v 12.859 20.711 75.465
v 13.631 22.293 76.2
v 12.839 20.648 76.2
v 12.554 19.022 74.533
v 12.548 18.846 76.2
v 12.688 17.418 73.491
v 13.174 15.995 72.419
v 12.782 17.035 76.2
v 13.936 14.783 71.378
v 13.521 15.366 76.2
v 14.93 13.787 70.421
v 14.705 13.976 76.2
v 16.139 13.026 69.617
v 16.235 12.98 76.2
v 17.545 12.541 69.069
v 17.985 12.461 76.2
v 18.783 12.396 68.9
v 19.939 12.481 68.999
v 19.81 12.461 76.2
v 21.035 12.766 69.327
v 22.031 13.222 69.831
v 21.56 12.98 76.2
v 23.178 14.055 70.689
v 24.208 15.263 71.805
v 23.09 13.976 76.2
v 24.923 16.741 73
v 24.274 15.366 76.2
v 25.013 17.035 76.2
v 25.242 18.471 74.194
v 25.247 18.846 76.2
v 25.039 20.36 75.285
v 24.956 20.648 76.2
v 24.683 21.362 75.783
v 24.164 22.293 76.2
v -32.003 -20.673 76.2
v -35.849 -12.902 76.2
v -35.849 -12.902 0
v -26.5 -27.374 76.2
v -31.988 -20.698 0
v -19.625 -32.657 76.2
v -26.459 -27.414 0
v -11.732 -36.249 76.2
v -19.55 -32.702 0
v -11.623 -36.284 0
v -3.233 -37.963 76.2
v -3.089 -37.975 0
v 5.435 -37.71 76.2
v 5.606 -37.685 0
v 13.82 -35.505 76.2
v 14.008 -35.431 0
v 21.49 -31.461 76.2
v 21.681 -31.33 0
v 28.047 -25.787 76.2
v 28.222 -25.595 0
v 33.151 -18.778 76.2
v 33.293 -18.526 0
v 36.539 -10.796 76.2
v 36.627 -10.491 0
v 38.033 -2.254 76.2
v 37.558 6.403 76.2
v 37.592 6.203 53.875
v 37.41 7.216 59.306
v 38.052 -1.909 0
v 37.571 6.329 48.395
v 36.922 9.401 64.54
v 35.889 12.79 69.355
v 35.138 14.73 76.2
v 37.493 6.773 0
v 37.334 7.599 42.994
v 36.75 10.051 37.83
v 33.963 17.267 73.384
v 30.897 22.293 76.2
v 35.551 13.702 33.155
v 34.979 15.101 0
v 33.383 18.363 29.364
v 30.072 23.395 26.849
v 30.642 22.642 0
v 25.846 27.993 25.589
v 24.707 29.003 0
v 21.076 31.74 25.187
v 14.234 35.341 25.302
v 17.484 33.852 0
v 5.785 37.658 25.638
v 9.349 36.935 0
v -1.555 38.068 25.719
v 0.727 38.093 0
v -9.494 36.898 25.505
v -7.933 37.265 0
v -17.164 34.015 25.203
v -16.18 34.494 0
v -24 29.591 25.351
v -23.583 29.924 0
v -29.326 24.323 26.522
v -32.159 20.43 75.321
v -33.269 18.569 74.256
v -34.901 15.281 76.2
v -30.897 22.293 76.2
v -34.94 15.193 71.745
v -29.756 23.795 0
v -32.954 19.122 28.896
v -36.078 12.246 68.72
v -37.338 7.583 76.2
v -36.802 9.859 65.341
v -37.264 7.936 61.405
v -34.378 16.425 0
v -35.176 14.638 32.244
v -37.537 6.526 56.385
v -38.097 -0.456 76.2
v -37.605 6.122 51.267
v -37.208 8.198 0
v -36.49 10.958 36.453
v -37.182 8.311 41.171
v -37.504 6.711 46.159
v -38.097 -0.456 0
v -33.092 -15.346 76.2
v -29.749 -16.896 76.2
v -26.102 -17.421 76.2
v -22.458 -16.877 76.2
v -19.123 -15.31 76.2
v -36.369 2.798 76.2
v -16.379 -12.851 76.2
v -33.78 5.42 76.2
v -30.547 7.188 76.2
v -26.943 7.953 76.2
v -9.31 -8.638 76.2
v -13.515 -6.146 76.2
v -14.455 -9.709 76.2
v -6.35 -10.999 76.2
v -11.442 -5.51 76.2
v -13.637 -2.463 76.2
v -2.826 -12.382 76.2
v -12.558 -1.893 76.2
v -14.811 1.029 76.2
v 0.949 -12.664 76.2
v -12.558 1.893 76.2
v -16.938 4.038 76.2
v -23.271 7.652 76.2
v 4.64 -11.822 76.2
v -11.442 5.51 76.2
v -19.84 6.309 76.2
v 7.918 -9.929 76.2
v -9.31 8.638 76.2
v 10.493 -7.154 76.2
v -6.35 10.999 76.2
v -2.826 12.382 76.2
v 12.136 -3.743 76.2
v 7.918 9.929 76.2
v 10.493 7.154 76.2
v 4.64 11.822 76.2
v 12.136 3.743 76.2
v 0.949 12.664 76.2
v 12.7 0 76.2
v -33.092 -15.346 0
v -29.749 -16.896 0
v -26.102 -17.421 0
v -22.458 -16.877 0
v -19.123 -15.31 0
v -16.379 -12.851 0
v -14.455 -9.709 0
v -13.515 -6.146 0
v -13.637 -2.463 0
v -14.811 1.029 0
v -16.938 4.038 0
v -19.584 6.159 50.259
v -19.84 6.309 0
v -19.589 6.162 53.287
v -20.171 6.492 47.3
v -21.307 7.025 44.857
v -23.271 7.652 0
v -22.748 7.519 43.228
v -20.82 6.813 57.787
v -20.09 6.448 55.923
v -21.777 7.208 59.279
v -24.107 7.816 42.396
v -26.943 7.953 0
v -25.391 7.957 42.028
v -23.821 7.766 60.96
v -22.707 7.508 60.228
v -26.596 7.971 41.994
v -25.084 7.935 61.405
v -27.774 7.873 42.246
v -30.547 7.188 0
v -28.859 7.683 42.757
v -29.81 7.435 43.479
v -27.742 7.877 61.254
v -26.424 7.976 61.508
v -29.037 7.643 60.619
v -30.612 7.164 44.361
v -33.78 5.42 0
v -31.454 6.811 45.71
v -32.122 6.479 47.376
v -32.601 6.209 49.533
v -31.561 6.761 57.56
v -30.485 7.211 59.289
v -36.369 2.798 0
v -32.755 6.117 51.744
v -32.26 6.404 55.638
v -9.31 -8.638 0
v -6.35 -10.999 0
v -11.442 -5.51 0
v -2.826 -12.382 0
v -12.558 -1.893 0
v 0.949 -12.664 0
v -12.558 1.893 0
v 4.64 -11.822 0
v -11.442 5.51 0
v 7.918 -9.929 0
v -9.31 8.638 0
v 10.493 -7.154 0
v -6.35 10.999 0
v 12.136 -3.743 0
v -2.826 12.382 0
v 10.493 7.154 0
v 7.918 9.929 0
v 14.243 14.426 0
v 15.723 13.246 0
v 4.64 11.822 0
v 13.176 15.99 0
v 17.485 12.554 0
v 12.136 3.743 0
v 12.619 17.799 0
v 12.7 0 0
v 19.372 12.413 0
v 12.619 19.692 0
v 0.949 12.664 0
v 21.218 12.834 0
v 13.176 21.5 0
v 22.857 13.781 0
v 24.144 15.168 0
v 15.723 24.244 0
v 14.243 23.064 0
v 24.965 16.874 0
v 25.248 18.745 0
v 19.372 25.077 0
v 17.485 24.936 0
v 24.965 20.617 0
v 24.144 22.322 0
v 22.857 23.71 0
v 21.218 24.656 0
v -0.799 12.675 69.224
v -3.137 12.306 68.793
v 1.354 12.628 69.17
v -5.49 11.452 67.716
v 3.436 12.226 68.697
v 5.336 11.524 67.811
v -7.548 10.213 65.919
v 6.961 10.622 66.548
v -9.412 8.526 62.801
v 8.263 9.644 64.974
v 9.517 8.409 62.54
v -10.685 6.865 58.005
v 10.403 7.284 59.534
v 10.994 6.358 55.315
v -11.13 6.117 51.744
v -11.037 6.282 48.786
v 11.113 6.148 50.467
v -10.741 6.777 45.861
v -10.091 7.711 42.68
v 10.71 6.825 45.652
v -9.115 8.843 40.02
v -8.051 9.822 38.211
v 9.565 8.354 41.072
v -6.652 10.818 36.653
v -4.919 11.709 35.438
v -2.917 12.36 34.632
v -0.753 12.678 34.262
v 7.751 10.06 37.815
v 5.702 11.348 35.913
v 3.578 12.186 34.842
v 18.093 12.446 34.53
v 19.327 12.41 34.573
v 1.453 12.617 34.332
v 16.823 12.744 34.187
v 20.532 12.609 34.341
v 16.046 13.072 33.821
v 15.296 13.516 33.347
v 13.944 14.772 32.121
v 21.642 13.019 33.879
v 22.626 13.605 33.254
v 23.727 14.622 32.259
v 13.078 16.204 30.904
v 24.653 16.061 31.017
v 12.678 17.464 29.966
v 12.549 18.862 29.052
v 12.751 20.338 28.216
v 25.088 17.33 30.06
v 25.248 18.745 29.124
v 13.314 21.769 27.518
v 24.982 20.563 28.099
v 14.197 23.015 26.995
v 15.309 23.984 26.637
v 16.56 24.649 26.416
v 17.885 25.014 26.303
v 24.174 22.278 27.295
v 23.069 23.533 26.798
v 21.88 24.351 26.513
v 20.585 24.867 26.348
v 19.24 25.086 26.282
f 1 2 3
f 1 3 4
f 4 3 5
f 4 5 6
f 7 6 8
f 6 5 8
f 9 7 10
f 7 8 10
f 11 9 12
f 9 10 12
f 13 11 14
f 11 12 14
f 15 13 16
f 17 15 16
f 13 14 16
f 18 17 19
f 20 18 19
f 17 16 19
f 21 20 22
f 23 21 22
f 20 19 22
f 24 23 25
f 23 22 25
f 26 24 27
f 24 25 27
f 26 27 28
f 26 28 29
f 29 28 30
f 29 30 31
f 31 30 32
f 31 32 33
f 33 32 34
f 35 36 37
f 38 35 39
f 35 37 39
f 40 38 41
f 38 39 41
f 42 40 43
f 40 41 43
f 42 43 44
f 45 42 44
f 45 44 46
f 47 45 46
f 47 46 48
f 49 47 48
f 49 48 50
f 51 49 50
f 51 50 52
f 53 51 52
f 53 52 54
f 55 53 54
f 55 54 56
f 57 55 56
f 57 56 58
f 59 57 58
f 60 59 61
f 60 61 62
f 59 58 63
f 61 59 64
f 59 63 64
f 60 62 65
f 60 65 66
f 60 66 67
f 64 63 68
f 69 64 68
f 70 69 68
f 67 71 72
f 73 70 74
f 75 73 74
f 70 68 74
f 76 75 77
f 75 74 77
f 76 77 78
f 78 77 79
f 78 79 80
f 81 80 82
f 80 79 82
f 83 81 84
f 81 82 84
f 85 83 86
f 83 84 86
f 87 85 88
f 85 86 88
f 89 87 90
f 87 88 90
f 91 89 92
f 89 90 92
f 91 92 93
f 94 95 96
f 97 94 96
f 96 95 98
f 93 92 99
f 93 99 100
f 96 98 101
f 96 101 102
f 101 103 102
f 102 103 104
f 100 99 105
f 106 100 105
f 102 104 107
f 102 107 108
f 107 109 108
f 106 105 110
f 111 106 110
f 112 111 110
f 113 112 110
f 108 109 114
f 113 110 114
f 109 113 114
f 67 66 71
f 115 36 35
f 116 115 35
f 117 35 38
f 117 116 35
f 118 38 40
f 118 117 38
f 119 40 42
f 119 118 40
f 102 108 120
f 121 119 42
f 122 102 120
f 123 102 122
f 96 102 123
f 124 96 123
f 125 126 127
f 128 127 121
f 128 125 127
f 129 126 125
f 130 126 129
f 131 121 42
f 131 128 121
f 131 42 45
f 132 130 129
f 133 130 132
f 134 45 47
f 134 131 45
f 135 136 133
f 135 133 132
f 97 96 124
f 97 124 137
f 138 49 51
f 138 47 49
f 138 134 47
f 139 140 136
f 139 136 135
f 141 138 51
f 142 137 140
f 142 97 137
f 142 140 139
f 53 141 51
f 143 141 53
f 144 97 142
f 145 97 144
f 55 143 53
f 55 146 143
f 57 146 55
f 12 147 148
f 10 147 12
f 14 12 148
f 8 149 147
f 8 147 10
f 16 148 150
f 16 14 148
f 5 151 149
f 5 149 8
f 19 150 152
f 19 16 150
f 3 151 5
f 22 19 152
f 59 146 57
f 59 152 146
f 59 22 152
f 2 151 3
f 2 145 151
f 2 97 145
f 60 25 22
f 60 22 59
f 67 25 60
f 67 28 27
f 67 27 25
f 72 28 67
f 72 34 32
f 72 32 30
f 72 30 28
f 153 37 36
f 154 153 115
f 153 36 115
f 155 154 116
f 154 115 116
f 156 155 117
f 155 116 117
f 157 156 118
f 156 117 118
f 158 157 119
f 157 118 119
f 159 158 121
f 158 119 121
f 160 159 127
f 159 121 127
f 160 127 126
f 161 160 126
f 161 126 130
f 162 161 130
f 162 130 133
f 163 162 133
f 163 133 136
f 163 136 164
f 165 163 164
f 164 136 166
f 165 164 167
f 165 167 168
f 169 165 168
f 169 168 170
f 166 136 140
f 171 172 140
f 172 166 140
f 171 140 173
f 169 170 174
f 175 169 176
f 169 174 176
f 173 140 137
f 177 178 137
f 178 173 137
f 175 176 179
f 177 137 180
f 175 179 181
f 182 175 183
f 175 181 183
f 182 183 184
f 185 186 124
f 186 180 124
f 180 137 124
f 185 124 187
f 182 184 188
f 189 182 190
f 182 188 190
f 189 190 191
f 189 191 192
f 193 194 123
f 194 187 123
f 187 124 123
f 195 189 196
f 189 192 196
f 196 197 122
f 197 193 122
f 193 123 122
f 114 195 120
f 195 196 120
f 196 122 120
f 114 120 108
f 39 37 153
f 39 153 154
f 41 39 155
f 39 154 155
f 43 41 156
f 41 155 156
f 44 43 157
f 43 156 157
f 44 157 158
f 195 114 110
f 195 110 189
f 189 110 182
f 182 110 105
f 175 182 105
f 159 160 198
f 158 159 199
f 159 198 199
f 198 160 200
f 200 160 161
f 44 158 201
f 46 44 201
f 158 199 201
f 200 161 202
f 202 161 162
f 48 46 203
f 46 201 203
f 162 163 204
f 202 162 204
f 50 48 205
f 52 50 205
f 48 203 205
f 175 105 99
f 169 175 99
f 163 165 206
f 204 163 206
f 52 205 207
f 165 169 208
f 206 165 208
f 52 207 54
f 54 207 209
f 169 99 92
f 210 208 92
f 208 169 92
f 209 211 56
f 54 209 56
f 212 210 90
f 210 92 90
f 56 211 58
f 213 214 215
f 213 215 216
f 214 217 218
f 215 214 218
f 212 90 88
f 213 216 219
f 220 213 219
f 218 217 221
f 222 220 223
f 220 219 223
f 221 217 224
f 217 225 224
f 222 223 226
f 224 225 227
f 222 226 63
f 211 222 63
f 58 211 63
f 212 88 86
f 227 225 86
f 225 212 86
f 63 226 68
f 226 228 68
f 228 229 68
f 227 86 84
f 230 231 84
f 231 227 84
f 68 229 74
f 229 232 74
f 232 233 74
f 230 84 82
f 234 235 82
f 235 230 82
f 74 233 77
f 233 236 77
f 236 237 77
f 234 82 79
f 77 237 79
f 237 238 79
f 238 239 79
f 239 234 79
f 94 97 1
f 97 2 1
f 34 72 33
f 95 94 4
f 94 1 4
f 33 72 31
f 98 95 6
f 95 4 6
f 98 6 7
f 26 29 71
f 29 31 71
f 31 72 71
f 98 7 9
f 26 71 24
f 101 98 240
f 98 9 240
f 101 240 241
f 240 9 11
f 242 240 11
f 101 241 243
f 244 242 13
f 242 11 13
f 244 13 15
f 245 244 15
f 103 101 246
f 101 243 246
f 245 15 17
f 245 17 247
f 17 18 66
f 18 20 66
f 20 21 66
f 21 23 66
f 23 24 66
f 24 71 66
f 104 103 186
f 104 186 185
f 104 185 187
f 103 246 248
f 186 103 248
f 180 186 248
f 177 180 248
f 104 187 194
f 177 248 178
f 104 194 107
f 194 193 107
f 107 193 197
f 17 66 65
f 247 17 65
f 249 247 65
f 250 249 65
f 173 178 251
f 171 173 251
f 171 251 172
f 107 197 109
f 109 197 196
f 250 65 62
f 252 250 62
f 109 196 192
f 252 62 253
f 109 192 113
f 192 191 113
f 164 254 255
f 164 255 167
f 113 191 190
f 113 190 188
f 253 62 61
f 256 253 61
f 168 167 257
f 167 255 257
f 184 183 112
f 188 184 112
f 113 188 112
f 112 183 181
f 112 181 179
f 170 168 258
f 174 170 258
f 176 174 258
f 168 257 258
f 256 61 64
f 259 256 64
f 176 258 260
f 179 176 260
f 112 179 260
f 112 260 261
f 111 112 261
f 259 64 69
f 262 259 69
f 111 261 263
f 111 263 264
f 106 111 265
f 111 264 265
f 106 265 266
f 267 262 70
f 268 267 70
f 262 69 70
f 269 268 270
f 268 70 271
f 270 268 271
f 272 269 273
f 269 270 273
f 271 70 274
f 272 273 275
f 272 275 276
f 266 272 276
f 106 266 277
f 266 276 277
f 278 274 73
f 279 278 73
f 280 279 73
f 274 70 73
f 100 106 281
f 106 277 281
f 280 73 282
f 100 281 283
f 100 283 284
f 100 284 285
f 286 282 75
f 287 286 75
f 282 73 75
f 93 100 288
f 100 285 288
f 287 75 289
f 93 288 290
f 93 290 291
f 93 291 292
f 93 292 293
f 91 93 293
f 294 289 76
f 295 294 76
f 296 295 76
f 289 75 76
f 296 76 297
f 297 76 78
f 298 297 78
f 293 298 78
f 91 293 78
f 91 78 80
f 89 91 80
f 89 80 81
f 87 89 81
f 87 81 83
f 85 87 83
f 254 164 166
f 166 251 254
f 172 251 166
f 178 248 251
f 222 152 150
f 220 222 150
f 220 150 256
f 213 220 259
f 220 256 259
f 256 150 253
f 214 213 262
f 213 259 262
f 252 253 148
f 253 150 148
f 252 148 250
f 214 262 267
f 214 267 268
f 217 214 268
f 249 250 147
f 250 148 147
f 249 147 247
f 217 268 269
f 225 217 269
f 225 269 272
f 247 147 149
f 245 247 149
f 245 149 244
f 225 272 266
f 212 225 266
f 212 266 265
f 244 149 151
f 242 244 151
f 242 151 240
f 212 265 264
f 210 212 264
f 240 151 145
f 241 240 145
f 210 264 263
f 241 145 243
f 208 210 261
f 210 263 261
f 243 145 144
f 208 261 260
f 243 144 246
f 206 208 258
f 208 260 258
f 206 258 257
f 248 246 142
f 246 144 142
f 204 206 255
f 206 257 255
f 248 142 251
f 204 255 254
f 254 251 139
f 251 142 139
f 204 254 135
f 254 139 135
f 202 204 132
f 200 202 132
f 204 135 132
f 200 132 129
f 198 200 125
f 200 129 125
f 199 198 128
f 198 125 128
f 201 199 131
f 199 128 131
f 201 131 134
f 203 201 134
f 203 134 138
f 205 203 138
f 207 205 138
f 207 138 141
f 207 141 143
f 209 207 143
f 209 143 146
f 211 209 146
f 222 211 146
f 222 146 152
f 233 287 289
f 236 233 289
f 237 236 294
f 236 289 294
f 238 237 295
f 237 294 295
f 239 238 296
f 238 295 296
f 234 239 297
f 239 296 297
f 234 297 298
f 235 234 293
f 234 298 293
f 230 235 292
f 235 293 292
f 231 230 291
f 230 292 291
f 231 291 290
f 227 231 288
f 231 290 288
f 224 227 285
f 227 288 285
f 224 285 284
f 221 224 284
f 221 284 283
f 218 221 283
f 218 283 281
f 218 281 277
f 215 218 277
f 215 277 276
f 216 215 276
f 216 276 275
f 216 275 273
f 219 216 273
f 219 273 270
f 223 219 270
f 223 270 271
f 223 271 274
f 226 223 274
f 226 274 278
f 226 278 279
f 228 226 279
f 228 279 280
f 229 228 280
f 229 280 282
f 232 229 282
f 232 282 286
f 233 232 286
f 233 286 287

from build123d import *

# Parameters (mm, degrees)
F0_R      = 38.1
F1_DEPTH  = 76.2
F2_R      = 12.7
F3_DEPTH  = 255.778
F4_R      = 6.35
F5_DEPTH  = 105.156
F7_R      = 12.7
F8_DEPTH  = 112.522
F10_DEPTH = 91.694


with BuildPart() as f1:
    # F0 (on Top) → F1 (new body)
    with BuildSketch(Plane.XY):
        Circle(F0_R)
    extrude(amount=F1_DEPTH)

    # F2 (on face) → F3 (cut)
    with BuildSketch(Plane.XY.offset(76.2)):
        Circle(F2_R)
    extrude(amount=-F3_DEPTH, mode=Mode.SUBTRACT)

    # F4 (on face) → F5 (cut)
    with BuildSketch(Plane.XY.offset(76.2)):
        with Locations((18.897600472, 18.7452007085)):
            Circle(F4_R)
    extrude(amount=-F5_DEPTH, mode=Mode.SUBTRACT)

    # F7 (on face) → F8 (cut)
    with BuildSketch(Plane.XY.offset(76.2)):
        with Locations((-26.1348858476, -4.7210869379)):
            Circle(F7_R)
    extrude(amount=-F8_DEPTH, mode=Mode.SUBTRACT)

    # F9 (on Right) → F10 (cut, symmetric)
    with BuildSketch(Plane.YZ):
        with BuildLine():
            ThreePointArc((53.601659511, 35.343534931), (57.8103975555, 43.0686388402), (59.2664996787, 51.7444945872))
            ThreePointArc((59.2664996787, 51.7444945872), (58.1456298442, 59.3810526604), (54.8775729197, 66.3734179491))
            ThreePointArc((54.8775729197, 66.3734179491), (42.9419800159, 51.3230223587), (53.601659511, 35.343534931))
        make_face()
        with BuildLine():
            ThreePointArc((54.8775729197, 66.3734179491), (58.1456298442, 59.3810526604), (59.2664996787, 51.7444945872))
            ThreePointArc((59.2664996787, 51.7444945872), (57.8103975555, 43.0686388402), (53.601659511, 35.343534931))
            ThreePointArc((53.601659511, 35.343534931), (68.575369435, 37.2686066813), (75.5599205639, 50.6526993162))
            ThreePointArc((75.5599205639, 50.6526993162), (69.1173648929, 63.6421228832), (54.8775729197, 66.3734179491))
        make_face()
        with BuildLine():
            ThreePointArc((53.601659511, 35.343534931), (42.9419800159, 51.3230223587), (54.8775729197, 66.3734179491))
            ThreePointArc((54.8775729197, 66.3734179491), (6.1397071015, 52.8362898582), (53.601659511, 35.343534931))
        make_face()
    extrude(amount=F10_DEPTH, both=True, mode=Mode.SUBTRACT)


solid = f1.part
